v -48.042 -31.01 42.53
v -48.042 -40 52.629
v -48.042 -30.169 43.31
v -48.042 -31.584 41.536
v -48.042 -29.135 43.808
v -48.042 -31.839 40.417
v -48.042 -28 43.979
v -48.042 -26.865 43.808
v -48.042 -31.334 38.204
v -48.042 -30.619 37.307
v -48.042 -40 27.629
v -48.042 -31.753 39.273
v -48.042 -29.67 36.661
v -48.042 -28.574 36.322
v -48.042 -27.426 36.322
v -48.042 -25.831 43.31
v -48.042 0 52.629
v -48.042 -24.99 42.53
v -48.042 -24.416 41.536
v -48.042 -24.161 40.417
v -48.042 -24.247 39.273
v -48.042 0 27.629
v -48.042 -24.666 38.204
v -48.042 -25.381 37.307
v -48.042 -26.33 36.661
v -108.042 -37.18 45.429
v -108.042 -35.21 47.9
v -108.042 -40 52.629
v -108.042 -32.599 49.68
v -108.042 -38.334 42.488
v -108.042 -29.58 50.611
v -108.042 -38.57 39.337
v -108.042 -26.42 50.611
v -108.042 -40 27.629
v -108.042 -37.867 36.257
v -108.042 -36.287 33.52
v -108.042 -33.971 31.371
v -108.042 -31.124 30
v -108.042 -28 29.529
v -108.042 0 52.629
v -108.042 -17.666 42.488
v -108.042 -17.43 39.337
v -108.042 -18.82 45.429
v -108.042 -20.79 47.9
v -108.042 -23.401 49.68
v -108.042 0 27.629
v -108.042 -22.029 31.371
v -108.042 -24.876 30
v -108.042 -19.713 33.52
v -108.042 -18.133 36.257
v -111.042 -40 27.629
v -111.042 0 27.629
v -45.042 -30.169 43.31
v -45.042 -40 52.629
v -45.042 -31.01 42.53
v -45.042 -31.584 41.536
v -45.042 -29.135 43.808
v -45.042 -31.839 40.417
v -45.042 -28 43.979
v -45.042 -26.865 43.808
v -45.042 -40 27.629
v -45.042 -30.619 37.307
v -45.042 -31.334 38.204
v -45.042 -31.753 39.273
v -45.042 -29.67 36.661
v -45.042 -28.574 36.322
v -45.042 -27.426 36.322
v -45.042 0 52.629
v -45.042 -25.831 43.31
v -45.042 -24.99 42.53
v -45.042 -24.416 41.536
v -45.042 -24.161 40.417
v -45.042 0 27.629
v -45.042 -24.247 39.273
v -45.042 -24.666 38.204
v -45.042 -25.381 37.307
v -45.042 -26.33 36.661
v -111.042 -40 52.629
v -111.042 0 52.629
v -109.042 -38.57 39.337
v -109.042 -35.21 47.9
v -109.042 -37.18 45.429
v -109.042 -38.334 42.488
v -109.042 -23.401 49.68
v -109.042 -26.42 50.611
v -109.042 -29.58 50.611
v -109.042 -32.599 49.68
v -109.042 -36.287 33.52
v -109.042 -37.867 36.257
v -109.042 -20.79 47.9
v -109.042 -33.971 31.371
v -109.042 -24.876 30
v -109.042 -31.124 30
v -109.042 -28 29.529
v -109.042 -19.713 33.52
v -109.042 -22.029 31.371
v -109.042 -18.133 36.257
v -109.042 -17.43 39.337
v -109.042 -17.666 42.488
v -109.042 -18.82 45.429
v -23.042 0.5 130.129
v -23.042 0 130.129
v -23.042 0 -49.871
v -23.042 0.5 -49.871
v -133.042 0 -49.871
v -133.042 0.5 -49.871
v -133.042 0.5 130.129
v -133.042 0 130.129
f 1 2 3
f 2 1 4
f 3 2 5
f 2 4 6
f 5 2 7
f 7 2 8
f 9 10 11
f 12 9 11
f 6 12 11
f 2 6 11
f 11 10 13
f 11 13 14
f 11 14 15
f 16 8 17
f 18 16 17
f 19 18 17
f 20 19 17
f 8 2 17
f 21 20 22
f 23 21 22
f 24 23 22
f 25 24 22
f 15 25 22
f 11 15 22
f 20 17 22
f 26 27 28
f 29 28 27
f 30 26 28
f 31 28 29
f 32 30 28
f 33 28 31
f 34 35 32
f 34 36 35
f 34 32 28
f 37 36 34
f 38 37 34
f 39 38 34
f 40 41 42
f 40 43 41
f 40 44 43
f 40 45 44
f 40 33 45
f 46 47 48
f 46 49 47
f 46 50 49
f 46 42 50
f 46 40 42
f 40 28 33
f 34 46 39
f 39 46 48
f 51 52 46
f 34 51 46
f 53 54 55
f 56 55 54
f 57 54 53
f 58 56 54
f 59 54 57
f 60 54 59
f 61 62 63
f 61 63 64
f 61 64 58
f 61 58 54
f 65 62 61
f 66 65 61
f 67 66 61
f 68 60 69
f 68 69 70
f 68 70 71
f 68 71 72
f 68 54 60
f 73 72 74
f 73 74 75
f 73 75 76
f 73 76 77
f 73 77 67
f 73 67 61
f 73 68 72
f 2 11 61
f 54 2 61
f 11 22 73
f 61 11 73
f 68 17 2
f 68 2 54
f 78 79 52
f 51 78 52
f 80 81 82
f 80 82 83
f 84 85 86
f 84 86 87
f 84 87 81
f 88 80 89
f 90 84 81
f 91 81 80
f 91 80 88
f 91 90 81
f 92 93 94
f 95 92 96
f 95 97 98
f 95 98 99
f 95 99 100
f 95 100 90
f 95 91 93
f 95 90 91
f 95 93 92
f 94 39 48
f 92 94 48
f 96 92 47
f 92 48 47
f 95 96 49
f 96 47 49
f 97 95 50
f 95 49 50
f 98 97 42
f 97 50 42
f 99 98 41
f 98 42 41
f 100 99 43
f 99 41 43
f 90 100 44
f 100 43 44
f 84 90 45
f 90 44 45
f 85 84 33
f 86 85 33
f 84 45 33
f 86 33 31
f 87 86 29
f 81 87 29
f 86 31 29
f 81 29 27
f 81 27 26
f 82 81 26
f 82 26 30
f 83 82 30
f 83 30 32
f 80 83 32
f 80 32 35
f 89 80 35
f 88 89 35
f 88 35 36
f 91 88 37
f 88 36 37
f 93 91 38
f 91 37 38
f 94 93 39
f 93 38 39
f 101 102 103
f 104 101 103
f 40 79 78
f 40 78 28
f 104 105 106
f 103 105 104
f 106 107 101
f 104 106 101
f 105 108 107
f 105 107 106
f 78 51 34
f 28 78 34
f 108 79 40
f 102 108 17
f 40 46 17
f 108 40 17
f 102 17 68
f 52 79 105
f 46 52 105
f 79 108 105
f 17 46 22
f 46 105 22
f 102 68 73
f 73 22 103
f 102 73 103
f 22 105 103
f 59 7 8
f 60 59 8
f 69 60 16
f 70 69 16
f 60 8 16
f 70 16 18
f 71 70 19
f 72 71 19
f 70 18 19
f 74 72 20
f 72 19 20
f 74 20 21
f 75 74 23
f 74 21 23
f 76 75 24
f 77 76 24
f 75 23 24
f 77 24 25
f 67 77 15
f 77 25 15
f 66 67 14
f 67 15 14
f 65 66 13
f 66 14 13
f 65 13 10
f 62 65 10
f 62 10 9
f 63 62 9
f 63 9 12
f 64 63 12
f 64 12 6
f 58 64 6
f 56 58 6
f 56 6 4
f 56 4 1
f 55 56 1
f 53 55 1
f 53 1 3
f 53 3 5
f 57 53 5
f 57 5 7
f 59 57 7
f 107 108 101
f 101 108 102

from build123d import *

# Parameters (mm, degrees)
SKETCH1_W           = 110
SKETCH1_H           = 180
BOSS_EXTRUDE1_DEPTH = 0.5
SKETCH1_3_W         = 3
SKETCH1_3_H         = 25
BOSS_EXTRUDE2_DEPTH = 40
SKETCH3_R           = 10.6
CUT_EXTRUDE1_DEPTH  = 1
SKETCH4_R           = 3.85
CUT_EXTRUDE2_DEPTH  = 161.494936001


with BuildPart() as part:
    # Sketch1 → Boss-Extrude1 (new body)
    with BuildSketch(Plane(origin=(0, 0, 0), x_dir=(1, 0, 0), z_dir=(0, 1, 0))):
        with Locations((-78.042251664, -40.129260668)):
            Rectangle(SKETCH1_W, SKETCH1_H)
    extrude(amount=BOSS_EXTRUDE1_DEPTH)

    # Sketch1<3> → Boss-Extrude2 (add)
    with BuildSketch(Plane(origin=(0, 0, 0), x_dir=(1, 0, 0), z_dir=(0, 1, 0))):
        with Locations((-109.542251664, -40.129260668)):
            Rectangle(SKETCH1_3_W, SKETCH1_3_H)
        with Locations((-46.542251664, -40.129260668)):
            Rectangle(SKETCH1_3_W, SKETCH1_3_H)
    extrude(amount=-BOSS_EXTRUDE2_DEPTH)

    # Sketch3 → Cut-Extrude1 (cut)
    with BuildSketch(Plane(origin=(-108.042251664, 0, 0), x_dir=(0, 0, -1), z_dir=(1, 0, 0))):
        with Locations((-40.129260668, -28)):
            Circle(SKETCH3_R)
    extrude(amount=-CUT_EXTRUDE1_DEPTH, mode=Mode.SUBTRACT)

    # Sketch4 → Cut-Extrude2 (cut, through all)
    with BuildSketch(Plane.ZY.offset(48.042251664)):
        with Locations((40.129260668, -28)):
            Circle(SKETCH4_R)
    extrude(amount=-CUT_EXTRUDE2_DEPTH, mode=Mode.SUBTRACT)


solid = part.part
